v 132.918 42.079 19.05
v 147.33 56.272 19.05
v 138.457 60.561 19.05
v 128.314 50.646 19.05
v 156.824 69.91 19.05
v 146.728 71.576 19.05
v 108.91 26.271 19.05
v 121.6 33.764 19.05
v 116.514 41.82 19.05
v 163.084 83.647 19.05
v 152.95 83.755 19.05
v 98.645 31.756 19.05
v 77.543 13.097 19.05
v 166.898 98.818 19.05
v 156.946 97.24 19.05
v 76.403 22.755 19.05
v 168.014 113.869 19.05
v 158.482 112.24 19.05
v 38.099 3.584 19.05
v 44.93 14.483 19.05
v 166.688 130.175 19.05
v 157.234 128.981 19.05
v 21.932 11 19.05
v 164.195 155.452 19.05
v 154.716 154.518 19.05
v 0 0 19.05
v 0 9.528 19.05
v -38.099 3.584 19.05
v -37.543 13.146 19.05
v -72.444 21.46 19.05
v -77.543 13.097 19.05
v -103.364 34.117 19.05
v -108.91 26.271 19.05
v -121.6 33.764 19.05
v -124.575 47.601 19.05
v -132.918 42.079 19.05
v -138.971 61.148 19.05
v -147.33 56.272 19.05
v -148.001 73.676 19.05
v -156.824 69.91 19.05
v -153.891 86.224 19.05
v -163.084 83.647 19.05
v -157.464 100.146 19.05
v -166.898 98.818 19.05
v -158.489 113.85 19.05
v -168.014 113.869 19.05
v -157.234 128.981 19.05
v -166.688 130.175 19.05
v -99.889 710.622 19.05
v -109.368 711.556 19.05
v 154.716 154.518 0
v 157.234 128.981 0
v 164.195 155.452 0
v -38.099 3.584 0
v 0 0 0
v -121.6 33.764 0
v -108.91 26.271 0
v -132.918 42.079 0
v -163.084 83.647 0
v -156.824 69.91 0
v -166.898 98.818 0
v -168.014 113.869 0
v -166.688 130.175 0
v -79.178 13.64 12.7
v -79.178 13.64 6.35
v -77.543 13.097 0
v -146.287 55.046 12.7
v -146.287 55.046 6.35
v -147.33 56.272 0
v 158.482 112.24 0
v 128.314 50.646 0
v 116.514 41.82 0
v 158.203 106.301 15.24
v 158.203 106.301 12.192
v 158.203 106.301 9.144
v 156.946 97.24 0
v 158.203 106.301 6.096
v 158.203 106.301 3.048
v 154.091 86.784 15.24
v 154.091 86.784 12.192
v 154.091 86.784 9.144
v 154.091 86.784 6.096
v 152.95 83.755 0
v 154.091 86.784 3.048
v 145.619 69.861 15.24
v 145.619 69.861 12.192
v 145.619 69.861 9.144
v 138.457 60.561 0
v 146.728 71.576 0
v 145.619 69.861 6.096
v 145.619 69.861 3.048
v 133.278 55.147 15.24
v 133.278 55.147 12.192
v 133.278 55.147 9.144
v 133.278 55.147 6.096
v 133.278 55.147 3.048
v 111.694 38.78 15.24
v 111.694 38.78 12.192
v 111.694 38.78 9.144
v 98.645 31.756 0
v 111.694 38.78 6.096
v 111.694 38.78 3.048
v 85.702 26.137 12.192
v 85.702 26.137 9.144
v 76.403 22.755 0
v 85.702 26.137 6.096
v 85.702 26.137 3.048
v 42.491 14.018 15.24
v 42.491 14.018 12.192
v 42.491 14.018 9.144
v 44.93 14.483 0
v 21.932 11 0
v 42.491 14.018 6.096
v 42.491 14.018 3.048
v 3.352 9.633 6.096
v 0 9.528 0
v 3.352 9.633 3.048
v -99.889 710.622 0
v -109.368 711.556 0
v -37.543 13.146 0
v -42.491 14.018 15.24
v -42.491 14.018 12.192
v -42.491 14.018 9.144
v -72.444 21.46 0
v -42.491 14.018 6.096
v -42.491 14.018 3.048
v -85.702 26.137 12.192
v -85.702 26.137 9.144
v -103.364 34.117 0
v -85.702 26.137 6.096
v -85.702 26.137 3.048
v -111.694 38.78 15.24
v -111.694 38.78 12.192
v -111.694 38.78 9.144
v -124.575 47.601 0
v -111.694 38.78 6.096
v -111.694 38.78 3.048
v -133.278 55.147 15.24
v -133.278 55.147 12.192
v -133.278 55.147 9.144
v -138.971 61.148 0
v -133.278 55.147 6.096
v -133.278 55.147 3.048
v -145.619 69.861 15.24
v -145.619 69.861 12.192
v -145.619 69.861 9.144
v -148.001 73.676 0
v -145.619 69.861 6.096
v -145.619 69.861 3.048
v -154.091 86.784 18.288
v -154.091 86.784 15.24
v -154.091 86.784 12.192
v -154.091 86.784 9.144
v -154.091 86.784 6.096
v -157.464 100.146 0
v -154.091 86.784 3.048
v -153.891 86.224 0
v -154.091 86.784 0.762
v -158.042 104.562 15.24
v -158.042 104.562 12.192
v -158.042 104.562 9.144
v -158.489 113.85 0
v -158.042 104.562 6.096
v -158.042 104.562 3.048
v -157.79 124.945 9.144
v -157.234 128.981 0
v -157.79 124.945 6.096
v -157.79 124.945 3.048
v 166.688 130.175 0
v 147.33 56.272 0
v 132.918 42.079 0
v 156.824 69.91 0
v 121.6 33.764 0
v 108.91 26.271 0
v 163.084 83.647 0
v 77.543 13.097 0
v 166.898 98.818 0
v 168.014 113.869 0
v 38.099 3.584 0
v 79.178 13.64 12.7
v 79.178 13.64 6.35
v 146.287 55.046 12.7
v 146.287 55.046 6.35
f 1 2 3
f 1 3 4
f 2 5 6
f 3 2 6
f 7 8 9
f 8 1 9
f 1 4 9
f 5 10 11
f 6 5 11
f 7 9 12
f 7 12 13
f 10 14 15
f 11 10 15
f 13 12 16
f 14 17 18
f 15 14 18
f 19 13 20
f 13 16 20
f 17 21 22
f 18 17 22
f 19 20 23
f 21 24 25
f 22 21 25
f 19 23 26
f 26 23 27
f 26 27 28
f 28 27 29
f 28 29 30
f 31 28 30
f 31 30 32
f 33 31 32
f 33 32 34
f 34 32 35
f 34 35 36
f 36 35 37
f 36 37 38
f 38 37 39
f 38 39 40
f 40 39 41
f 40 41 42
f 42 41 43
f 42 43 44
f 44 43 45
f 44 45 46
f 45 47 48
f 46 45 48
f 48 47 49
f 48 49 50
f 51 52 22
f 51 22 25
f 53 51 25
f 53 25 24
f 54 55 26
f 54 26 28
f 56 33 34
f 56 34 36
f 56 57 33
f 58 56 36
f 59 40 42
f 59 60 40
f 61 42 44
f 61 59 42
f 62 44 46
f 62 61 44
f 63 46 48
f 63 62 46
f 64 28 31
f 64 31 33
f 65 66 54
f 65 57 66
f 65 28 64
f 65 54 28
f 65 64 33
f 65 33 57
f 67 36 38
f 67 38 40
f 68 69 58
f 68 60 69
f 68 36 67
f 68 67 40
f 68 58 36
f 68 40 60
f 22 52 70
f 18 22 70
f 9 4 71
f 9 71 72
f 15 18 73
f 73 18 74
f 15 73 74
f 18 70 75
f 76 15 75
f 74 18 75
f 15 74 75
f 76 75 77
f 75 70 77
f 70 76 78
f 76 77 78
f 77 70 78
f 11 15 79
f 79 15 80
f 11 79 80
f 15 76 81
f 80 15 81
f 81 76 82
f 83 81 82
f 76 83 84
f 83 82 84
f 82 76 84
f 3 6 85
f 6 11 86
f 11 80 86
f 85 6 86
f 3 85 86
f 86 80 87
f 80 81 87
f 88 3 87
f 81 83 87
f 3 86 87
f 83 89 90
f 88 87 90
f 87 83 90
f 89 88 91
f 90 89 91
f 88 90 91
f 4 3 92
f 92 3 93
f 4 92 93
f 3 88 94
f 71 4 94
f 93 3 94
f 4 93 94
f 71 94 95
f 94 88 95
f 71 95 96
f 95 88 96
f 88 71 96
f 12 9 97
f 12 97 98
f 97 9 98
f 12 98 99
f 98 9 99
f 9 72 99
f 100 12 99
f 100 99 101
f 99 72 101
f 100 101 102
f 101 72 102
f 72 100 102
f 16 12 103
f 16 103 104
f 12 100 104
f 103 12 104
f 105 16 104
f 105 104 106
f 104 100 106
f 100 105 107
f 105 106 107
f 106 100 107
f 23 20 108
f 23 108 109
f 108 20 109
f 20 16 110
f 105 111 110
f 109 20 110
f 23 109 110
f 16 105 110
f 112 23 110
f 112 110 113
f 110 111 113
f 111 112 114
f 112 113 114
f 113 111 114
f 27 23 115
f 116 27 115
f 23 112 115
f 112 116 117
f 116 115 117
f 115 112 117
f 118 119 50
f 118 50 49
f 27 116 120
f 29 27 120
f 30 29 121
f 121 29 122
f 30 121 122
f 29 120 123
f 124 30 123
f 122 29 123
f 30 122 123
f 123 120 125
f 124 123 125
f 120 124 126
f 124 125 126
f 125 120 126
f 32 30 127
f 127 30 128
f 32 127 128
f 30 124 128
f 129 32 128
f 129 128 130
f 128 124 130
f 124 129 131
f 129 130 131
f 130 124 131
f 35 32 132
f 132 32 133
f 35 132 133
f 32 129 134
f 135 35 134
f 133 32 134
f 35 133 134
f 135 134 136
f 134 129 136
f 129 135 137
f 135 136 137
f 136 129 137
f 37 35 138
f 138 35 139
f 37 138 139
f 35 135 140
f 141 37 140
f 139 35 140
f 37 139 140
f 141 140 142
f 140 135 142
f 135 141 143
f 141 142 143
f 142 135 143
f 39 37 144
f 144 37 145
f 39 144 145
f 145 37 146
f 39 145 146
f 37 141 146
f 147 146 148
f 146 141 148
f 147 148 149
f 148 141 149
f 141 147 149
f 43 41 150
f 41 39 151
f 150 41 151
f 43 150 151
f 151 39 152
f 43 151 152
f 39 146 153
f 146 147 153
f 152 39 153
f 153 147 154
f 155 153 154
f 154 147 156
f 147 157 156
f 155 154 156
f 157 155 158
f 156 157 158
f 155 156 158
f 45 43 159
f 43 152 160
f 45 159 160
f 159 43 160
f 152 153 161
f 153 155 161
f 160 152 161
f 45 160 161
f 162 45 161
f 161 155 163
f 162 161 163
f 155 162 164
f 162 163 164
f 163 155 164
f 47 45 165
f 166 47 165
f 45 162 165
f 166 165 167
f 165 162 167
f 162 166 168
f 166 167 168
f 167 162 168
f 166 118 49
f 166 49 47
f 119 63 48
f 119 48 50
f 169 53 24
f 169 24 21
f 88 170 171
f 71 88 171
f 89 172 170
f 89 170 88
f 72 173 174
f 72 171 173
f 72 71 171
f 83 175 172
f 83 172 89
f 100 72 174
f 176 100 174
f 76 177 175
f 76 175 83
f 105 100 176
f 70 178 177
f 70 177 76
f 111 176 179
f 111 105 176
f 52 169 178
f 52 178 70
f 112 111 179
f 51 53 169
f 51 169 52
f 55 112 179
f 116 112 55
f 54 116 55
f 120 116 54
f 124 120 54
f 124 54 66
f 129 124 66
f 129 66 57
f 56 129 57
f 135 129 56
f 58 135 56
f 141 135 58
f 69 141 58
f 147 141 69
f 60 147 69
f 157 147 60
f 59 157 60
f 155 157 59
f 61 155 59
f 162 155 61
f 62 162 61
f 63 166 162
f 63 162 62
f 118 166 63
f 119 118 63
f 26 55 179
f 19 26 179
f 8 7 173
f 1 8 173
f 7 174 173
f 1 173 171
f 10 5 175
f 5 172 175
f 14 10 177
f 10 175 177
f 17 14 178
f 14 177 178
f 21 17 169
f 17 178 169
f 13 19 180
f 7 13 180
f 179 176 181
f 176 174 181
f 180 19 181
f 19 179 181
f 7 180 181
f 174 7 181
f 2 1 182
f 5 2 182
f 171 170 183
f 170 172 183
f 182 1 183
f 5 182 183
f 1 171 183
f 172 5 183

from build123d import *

# Parameters (mm, degrees)
BOSS_EXTRUDE1_DEPTH = 19.05


with BuildPart() as part:
    # Sketch1 → Boss-Extrude1 (new body)
    with BuildSketch(Plane.XY):
        with BuildLine():
            Line((157.234081882, 128.980548454), (154.716315658, 154.51789158))
            Line((154.716315658, 154.51789158), (164.195357535, 155.452445004))
            Line((164.195357535, 155.452445004), (166.6875, 130.175))
            add(Edge.make_bspline(
                [(0, 0), (73.666580622, 1.740675992), (181.188092361, 36.200835609), (166.6875, 130.175)],
                knots=[0, 0, 0, 0, 1, 1, 1, 1], degree=3))
            add(Edge.make_bspline(
                [(0, 0), (-73.666580622, 1.740675992), (-181.188092361, 36.200835609), (-166.6875, 130.175)],
                knots=[0, 0, 0, 0, 1, 1, 1, 1], degree=3))
            Line((-166.6875, 130.175), (-109.368223301, 711.556235093))
            Line((-109.368223301, 711.556235093), (-99.889181424, 710.621681669))
            Line((-99.889181424, 710.621681669), (-157.234081882, 128.980548454))
            add(Edge.make_bspline(
                [(0, 9.52776174), (-1.117611602, 9.555193192), (-3.340472897, 9.624755056), (-7.880039481, 9.827207732), (-13.652210416, 10.198958437), (-20.725459036, 10.840441372), (-30.303235723, 11.962316267), (-42.47749757, 13.875858033), (-57.165232888, 17.02314898), (-71.689613059, 21.050850851), (-90.515854195, 27.626537064), (-112.436111514, 38.157452487), (-130.643933928, 51.803557723), (-142.189146149, 64.564536934), (-149.192253507, 75.075537554), (-153.541361304, 84.674022673), (-156.058613173, 92.923629982), (-157.442658539, 99.418206789), (-158.29640922, 106.242287005), (-158.540175044, 112.221426054), (-158.437150466, 117.190167219), (-158.20642164, 121.010360535), (-157.881730698, 124.277278241), (-157.584058118, 126.601085874), (-157.415798733, 127.781927866), (-157.316566229, 128.446705395), (-157.261207353, 128.804756083), (-157.234081882, 128.980548454)],
                knots=[0.001057036, 0.001057036, 0.001057036, 0.001057036, 0.016679825, 0.032302613, 0.063548191, 0.094793768, 0.126039346, 0.1885305, 0.251021655, 0.31351281, 0.376003965, 0.500986274, 0.625968584, 0.688459739, 0.750950893, 0.813442048, 0.844687626, 0.875933203, 0.90717878, 0.938424358, 0.954047147, 0.969669935, 0.985292724, 0.993104118, 0.997009815, 0.998962664, 1.000915513, 1.000915513, 1.000915513, 1.000915513], degree=3))
            add(Edge.make_bspline(
                [(157.234081882, 128.980548454), (157.261207353, 128.804756083), (157.316566229, 128.446705395), (157.415798733, 127.781927866), (157.584058118, 126.601085874), (157.881730698, 124.277278241), (158.20642164, 121.010360535), (158.437150466, 117.190167219), (158.540175044, 112.221426054), (158.29640922, 106.242287005), (157.442658539, 99.418206789), (156.058613173, 92.923629982), (153.541361304, 84.674022673), (149.192253507, 75.075537554), (142.189146149, 64.564536934), (130.643933928, 51.803557723), (112.436111514, 38.157452487), (90.515854195, 27.626537064), (71.689613059, 21.050850851), (57.165232888, 17.02314898), (42.47749757, 13.875858033), (30.303235723, 11.962316267), (20.725459036, 10.840441372), (13.652210416, 10.198958437), (7.880039481, 9.827207732), (3.340472897, 9.624755056), (1.117611602, 9.555193192), (0, 9.52776174)],
                knots=[0.001057036, 0.001057036, 0.001057036, 0.001057036, 0.003009885, 0.004962733, 0.00886843, 0.016679825, 0.032302613, 0.047925402, 0.063548191, 0.094793768, 0.126039346, 0.157284923, 0.1885305, 0.251021655, 0.31351281, 0.376003965, 0.500986274, 0.625968584, 0.688459739, 0.750950893, 0.813442048, 0.875933203, 0.90717878, 0.938424358, 0.969669935, 0.985292724, 1.000915513, 1.000915513, 1.000915513, 1.000915513], degree=3))
        make_face()
    extrude(amount=BOSS_EXTRUDE1_DEPTH)


solid = part.part
